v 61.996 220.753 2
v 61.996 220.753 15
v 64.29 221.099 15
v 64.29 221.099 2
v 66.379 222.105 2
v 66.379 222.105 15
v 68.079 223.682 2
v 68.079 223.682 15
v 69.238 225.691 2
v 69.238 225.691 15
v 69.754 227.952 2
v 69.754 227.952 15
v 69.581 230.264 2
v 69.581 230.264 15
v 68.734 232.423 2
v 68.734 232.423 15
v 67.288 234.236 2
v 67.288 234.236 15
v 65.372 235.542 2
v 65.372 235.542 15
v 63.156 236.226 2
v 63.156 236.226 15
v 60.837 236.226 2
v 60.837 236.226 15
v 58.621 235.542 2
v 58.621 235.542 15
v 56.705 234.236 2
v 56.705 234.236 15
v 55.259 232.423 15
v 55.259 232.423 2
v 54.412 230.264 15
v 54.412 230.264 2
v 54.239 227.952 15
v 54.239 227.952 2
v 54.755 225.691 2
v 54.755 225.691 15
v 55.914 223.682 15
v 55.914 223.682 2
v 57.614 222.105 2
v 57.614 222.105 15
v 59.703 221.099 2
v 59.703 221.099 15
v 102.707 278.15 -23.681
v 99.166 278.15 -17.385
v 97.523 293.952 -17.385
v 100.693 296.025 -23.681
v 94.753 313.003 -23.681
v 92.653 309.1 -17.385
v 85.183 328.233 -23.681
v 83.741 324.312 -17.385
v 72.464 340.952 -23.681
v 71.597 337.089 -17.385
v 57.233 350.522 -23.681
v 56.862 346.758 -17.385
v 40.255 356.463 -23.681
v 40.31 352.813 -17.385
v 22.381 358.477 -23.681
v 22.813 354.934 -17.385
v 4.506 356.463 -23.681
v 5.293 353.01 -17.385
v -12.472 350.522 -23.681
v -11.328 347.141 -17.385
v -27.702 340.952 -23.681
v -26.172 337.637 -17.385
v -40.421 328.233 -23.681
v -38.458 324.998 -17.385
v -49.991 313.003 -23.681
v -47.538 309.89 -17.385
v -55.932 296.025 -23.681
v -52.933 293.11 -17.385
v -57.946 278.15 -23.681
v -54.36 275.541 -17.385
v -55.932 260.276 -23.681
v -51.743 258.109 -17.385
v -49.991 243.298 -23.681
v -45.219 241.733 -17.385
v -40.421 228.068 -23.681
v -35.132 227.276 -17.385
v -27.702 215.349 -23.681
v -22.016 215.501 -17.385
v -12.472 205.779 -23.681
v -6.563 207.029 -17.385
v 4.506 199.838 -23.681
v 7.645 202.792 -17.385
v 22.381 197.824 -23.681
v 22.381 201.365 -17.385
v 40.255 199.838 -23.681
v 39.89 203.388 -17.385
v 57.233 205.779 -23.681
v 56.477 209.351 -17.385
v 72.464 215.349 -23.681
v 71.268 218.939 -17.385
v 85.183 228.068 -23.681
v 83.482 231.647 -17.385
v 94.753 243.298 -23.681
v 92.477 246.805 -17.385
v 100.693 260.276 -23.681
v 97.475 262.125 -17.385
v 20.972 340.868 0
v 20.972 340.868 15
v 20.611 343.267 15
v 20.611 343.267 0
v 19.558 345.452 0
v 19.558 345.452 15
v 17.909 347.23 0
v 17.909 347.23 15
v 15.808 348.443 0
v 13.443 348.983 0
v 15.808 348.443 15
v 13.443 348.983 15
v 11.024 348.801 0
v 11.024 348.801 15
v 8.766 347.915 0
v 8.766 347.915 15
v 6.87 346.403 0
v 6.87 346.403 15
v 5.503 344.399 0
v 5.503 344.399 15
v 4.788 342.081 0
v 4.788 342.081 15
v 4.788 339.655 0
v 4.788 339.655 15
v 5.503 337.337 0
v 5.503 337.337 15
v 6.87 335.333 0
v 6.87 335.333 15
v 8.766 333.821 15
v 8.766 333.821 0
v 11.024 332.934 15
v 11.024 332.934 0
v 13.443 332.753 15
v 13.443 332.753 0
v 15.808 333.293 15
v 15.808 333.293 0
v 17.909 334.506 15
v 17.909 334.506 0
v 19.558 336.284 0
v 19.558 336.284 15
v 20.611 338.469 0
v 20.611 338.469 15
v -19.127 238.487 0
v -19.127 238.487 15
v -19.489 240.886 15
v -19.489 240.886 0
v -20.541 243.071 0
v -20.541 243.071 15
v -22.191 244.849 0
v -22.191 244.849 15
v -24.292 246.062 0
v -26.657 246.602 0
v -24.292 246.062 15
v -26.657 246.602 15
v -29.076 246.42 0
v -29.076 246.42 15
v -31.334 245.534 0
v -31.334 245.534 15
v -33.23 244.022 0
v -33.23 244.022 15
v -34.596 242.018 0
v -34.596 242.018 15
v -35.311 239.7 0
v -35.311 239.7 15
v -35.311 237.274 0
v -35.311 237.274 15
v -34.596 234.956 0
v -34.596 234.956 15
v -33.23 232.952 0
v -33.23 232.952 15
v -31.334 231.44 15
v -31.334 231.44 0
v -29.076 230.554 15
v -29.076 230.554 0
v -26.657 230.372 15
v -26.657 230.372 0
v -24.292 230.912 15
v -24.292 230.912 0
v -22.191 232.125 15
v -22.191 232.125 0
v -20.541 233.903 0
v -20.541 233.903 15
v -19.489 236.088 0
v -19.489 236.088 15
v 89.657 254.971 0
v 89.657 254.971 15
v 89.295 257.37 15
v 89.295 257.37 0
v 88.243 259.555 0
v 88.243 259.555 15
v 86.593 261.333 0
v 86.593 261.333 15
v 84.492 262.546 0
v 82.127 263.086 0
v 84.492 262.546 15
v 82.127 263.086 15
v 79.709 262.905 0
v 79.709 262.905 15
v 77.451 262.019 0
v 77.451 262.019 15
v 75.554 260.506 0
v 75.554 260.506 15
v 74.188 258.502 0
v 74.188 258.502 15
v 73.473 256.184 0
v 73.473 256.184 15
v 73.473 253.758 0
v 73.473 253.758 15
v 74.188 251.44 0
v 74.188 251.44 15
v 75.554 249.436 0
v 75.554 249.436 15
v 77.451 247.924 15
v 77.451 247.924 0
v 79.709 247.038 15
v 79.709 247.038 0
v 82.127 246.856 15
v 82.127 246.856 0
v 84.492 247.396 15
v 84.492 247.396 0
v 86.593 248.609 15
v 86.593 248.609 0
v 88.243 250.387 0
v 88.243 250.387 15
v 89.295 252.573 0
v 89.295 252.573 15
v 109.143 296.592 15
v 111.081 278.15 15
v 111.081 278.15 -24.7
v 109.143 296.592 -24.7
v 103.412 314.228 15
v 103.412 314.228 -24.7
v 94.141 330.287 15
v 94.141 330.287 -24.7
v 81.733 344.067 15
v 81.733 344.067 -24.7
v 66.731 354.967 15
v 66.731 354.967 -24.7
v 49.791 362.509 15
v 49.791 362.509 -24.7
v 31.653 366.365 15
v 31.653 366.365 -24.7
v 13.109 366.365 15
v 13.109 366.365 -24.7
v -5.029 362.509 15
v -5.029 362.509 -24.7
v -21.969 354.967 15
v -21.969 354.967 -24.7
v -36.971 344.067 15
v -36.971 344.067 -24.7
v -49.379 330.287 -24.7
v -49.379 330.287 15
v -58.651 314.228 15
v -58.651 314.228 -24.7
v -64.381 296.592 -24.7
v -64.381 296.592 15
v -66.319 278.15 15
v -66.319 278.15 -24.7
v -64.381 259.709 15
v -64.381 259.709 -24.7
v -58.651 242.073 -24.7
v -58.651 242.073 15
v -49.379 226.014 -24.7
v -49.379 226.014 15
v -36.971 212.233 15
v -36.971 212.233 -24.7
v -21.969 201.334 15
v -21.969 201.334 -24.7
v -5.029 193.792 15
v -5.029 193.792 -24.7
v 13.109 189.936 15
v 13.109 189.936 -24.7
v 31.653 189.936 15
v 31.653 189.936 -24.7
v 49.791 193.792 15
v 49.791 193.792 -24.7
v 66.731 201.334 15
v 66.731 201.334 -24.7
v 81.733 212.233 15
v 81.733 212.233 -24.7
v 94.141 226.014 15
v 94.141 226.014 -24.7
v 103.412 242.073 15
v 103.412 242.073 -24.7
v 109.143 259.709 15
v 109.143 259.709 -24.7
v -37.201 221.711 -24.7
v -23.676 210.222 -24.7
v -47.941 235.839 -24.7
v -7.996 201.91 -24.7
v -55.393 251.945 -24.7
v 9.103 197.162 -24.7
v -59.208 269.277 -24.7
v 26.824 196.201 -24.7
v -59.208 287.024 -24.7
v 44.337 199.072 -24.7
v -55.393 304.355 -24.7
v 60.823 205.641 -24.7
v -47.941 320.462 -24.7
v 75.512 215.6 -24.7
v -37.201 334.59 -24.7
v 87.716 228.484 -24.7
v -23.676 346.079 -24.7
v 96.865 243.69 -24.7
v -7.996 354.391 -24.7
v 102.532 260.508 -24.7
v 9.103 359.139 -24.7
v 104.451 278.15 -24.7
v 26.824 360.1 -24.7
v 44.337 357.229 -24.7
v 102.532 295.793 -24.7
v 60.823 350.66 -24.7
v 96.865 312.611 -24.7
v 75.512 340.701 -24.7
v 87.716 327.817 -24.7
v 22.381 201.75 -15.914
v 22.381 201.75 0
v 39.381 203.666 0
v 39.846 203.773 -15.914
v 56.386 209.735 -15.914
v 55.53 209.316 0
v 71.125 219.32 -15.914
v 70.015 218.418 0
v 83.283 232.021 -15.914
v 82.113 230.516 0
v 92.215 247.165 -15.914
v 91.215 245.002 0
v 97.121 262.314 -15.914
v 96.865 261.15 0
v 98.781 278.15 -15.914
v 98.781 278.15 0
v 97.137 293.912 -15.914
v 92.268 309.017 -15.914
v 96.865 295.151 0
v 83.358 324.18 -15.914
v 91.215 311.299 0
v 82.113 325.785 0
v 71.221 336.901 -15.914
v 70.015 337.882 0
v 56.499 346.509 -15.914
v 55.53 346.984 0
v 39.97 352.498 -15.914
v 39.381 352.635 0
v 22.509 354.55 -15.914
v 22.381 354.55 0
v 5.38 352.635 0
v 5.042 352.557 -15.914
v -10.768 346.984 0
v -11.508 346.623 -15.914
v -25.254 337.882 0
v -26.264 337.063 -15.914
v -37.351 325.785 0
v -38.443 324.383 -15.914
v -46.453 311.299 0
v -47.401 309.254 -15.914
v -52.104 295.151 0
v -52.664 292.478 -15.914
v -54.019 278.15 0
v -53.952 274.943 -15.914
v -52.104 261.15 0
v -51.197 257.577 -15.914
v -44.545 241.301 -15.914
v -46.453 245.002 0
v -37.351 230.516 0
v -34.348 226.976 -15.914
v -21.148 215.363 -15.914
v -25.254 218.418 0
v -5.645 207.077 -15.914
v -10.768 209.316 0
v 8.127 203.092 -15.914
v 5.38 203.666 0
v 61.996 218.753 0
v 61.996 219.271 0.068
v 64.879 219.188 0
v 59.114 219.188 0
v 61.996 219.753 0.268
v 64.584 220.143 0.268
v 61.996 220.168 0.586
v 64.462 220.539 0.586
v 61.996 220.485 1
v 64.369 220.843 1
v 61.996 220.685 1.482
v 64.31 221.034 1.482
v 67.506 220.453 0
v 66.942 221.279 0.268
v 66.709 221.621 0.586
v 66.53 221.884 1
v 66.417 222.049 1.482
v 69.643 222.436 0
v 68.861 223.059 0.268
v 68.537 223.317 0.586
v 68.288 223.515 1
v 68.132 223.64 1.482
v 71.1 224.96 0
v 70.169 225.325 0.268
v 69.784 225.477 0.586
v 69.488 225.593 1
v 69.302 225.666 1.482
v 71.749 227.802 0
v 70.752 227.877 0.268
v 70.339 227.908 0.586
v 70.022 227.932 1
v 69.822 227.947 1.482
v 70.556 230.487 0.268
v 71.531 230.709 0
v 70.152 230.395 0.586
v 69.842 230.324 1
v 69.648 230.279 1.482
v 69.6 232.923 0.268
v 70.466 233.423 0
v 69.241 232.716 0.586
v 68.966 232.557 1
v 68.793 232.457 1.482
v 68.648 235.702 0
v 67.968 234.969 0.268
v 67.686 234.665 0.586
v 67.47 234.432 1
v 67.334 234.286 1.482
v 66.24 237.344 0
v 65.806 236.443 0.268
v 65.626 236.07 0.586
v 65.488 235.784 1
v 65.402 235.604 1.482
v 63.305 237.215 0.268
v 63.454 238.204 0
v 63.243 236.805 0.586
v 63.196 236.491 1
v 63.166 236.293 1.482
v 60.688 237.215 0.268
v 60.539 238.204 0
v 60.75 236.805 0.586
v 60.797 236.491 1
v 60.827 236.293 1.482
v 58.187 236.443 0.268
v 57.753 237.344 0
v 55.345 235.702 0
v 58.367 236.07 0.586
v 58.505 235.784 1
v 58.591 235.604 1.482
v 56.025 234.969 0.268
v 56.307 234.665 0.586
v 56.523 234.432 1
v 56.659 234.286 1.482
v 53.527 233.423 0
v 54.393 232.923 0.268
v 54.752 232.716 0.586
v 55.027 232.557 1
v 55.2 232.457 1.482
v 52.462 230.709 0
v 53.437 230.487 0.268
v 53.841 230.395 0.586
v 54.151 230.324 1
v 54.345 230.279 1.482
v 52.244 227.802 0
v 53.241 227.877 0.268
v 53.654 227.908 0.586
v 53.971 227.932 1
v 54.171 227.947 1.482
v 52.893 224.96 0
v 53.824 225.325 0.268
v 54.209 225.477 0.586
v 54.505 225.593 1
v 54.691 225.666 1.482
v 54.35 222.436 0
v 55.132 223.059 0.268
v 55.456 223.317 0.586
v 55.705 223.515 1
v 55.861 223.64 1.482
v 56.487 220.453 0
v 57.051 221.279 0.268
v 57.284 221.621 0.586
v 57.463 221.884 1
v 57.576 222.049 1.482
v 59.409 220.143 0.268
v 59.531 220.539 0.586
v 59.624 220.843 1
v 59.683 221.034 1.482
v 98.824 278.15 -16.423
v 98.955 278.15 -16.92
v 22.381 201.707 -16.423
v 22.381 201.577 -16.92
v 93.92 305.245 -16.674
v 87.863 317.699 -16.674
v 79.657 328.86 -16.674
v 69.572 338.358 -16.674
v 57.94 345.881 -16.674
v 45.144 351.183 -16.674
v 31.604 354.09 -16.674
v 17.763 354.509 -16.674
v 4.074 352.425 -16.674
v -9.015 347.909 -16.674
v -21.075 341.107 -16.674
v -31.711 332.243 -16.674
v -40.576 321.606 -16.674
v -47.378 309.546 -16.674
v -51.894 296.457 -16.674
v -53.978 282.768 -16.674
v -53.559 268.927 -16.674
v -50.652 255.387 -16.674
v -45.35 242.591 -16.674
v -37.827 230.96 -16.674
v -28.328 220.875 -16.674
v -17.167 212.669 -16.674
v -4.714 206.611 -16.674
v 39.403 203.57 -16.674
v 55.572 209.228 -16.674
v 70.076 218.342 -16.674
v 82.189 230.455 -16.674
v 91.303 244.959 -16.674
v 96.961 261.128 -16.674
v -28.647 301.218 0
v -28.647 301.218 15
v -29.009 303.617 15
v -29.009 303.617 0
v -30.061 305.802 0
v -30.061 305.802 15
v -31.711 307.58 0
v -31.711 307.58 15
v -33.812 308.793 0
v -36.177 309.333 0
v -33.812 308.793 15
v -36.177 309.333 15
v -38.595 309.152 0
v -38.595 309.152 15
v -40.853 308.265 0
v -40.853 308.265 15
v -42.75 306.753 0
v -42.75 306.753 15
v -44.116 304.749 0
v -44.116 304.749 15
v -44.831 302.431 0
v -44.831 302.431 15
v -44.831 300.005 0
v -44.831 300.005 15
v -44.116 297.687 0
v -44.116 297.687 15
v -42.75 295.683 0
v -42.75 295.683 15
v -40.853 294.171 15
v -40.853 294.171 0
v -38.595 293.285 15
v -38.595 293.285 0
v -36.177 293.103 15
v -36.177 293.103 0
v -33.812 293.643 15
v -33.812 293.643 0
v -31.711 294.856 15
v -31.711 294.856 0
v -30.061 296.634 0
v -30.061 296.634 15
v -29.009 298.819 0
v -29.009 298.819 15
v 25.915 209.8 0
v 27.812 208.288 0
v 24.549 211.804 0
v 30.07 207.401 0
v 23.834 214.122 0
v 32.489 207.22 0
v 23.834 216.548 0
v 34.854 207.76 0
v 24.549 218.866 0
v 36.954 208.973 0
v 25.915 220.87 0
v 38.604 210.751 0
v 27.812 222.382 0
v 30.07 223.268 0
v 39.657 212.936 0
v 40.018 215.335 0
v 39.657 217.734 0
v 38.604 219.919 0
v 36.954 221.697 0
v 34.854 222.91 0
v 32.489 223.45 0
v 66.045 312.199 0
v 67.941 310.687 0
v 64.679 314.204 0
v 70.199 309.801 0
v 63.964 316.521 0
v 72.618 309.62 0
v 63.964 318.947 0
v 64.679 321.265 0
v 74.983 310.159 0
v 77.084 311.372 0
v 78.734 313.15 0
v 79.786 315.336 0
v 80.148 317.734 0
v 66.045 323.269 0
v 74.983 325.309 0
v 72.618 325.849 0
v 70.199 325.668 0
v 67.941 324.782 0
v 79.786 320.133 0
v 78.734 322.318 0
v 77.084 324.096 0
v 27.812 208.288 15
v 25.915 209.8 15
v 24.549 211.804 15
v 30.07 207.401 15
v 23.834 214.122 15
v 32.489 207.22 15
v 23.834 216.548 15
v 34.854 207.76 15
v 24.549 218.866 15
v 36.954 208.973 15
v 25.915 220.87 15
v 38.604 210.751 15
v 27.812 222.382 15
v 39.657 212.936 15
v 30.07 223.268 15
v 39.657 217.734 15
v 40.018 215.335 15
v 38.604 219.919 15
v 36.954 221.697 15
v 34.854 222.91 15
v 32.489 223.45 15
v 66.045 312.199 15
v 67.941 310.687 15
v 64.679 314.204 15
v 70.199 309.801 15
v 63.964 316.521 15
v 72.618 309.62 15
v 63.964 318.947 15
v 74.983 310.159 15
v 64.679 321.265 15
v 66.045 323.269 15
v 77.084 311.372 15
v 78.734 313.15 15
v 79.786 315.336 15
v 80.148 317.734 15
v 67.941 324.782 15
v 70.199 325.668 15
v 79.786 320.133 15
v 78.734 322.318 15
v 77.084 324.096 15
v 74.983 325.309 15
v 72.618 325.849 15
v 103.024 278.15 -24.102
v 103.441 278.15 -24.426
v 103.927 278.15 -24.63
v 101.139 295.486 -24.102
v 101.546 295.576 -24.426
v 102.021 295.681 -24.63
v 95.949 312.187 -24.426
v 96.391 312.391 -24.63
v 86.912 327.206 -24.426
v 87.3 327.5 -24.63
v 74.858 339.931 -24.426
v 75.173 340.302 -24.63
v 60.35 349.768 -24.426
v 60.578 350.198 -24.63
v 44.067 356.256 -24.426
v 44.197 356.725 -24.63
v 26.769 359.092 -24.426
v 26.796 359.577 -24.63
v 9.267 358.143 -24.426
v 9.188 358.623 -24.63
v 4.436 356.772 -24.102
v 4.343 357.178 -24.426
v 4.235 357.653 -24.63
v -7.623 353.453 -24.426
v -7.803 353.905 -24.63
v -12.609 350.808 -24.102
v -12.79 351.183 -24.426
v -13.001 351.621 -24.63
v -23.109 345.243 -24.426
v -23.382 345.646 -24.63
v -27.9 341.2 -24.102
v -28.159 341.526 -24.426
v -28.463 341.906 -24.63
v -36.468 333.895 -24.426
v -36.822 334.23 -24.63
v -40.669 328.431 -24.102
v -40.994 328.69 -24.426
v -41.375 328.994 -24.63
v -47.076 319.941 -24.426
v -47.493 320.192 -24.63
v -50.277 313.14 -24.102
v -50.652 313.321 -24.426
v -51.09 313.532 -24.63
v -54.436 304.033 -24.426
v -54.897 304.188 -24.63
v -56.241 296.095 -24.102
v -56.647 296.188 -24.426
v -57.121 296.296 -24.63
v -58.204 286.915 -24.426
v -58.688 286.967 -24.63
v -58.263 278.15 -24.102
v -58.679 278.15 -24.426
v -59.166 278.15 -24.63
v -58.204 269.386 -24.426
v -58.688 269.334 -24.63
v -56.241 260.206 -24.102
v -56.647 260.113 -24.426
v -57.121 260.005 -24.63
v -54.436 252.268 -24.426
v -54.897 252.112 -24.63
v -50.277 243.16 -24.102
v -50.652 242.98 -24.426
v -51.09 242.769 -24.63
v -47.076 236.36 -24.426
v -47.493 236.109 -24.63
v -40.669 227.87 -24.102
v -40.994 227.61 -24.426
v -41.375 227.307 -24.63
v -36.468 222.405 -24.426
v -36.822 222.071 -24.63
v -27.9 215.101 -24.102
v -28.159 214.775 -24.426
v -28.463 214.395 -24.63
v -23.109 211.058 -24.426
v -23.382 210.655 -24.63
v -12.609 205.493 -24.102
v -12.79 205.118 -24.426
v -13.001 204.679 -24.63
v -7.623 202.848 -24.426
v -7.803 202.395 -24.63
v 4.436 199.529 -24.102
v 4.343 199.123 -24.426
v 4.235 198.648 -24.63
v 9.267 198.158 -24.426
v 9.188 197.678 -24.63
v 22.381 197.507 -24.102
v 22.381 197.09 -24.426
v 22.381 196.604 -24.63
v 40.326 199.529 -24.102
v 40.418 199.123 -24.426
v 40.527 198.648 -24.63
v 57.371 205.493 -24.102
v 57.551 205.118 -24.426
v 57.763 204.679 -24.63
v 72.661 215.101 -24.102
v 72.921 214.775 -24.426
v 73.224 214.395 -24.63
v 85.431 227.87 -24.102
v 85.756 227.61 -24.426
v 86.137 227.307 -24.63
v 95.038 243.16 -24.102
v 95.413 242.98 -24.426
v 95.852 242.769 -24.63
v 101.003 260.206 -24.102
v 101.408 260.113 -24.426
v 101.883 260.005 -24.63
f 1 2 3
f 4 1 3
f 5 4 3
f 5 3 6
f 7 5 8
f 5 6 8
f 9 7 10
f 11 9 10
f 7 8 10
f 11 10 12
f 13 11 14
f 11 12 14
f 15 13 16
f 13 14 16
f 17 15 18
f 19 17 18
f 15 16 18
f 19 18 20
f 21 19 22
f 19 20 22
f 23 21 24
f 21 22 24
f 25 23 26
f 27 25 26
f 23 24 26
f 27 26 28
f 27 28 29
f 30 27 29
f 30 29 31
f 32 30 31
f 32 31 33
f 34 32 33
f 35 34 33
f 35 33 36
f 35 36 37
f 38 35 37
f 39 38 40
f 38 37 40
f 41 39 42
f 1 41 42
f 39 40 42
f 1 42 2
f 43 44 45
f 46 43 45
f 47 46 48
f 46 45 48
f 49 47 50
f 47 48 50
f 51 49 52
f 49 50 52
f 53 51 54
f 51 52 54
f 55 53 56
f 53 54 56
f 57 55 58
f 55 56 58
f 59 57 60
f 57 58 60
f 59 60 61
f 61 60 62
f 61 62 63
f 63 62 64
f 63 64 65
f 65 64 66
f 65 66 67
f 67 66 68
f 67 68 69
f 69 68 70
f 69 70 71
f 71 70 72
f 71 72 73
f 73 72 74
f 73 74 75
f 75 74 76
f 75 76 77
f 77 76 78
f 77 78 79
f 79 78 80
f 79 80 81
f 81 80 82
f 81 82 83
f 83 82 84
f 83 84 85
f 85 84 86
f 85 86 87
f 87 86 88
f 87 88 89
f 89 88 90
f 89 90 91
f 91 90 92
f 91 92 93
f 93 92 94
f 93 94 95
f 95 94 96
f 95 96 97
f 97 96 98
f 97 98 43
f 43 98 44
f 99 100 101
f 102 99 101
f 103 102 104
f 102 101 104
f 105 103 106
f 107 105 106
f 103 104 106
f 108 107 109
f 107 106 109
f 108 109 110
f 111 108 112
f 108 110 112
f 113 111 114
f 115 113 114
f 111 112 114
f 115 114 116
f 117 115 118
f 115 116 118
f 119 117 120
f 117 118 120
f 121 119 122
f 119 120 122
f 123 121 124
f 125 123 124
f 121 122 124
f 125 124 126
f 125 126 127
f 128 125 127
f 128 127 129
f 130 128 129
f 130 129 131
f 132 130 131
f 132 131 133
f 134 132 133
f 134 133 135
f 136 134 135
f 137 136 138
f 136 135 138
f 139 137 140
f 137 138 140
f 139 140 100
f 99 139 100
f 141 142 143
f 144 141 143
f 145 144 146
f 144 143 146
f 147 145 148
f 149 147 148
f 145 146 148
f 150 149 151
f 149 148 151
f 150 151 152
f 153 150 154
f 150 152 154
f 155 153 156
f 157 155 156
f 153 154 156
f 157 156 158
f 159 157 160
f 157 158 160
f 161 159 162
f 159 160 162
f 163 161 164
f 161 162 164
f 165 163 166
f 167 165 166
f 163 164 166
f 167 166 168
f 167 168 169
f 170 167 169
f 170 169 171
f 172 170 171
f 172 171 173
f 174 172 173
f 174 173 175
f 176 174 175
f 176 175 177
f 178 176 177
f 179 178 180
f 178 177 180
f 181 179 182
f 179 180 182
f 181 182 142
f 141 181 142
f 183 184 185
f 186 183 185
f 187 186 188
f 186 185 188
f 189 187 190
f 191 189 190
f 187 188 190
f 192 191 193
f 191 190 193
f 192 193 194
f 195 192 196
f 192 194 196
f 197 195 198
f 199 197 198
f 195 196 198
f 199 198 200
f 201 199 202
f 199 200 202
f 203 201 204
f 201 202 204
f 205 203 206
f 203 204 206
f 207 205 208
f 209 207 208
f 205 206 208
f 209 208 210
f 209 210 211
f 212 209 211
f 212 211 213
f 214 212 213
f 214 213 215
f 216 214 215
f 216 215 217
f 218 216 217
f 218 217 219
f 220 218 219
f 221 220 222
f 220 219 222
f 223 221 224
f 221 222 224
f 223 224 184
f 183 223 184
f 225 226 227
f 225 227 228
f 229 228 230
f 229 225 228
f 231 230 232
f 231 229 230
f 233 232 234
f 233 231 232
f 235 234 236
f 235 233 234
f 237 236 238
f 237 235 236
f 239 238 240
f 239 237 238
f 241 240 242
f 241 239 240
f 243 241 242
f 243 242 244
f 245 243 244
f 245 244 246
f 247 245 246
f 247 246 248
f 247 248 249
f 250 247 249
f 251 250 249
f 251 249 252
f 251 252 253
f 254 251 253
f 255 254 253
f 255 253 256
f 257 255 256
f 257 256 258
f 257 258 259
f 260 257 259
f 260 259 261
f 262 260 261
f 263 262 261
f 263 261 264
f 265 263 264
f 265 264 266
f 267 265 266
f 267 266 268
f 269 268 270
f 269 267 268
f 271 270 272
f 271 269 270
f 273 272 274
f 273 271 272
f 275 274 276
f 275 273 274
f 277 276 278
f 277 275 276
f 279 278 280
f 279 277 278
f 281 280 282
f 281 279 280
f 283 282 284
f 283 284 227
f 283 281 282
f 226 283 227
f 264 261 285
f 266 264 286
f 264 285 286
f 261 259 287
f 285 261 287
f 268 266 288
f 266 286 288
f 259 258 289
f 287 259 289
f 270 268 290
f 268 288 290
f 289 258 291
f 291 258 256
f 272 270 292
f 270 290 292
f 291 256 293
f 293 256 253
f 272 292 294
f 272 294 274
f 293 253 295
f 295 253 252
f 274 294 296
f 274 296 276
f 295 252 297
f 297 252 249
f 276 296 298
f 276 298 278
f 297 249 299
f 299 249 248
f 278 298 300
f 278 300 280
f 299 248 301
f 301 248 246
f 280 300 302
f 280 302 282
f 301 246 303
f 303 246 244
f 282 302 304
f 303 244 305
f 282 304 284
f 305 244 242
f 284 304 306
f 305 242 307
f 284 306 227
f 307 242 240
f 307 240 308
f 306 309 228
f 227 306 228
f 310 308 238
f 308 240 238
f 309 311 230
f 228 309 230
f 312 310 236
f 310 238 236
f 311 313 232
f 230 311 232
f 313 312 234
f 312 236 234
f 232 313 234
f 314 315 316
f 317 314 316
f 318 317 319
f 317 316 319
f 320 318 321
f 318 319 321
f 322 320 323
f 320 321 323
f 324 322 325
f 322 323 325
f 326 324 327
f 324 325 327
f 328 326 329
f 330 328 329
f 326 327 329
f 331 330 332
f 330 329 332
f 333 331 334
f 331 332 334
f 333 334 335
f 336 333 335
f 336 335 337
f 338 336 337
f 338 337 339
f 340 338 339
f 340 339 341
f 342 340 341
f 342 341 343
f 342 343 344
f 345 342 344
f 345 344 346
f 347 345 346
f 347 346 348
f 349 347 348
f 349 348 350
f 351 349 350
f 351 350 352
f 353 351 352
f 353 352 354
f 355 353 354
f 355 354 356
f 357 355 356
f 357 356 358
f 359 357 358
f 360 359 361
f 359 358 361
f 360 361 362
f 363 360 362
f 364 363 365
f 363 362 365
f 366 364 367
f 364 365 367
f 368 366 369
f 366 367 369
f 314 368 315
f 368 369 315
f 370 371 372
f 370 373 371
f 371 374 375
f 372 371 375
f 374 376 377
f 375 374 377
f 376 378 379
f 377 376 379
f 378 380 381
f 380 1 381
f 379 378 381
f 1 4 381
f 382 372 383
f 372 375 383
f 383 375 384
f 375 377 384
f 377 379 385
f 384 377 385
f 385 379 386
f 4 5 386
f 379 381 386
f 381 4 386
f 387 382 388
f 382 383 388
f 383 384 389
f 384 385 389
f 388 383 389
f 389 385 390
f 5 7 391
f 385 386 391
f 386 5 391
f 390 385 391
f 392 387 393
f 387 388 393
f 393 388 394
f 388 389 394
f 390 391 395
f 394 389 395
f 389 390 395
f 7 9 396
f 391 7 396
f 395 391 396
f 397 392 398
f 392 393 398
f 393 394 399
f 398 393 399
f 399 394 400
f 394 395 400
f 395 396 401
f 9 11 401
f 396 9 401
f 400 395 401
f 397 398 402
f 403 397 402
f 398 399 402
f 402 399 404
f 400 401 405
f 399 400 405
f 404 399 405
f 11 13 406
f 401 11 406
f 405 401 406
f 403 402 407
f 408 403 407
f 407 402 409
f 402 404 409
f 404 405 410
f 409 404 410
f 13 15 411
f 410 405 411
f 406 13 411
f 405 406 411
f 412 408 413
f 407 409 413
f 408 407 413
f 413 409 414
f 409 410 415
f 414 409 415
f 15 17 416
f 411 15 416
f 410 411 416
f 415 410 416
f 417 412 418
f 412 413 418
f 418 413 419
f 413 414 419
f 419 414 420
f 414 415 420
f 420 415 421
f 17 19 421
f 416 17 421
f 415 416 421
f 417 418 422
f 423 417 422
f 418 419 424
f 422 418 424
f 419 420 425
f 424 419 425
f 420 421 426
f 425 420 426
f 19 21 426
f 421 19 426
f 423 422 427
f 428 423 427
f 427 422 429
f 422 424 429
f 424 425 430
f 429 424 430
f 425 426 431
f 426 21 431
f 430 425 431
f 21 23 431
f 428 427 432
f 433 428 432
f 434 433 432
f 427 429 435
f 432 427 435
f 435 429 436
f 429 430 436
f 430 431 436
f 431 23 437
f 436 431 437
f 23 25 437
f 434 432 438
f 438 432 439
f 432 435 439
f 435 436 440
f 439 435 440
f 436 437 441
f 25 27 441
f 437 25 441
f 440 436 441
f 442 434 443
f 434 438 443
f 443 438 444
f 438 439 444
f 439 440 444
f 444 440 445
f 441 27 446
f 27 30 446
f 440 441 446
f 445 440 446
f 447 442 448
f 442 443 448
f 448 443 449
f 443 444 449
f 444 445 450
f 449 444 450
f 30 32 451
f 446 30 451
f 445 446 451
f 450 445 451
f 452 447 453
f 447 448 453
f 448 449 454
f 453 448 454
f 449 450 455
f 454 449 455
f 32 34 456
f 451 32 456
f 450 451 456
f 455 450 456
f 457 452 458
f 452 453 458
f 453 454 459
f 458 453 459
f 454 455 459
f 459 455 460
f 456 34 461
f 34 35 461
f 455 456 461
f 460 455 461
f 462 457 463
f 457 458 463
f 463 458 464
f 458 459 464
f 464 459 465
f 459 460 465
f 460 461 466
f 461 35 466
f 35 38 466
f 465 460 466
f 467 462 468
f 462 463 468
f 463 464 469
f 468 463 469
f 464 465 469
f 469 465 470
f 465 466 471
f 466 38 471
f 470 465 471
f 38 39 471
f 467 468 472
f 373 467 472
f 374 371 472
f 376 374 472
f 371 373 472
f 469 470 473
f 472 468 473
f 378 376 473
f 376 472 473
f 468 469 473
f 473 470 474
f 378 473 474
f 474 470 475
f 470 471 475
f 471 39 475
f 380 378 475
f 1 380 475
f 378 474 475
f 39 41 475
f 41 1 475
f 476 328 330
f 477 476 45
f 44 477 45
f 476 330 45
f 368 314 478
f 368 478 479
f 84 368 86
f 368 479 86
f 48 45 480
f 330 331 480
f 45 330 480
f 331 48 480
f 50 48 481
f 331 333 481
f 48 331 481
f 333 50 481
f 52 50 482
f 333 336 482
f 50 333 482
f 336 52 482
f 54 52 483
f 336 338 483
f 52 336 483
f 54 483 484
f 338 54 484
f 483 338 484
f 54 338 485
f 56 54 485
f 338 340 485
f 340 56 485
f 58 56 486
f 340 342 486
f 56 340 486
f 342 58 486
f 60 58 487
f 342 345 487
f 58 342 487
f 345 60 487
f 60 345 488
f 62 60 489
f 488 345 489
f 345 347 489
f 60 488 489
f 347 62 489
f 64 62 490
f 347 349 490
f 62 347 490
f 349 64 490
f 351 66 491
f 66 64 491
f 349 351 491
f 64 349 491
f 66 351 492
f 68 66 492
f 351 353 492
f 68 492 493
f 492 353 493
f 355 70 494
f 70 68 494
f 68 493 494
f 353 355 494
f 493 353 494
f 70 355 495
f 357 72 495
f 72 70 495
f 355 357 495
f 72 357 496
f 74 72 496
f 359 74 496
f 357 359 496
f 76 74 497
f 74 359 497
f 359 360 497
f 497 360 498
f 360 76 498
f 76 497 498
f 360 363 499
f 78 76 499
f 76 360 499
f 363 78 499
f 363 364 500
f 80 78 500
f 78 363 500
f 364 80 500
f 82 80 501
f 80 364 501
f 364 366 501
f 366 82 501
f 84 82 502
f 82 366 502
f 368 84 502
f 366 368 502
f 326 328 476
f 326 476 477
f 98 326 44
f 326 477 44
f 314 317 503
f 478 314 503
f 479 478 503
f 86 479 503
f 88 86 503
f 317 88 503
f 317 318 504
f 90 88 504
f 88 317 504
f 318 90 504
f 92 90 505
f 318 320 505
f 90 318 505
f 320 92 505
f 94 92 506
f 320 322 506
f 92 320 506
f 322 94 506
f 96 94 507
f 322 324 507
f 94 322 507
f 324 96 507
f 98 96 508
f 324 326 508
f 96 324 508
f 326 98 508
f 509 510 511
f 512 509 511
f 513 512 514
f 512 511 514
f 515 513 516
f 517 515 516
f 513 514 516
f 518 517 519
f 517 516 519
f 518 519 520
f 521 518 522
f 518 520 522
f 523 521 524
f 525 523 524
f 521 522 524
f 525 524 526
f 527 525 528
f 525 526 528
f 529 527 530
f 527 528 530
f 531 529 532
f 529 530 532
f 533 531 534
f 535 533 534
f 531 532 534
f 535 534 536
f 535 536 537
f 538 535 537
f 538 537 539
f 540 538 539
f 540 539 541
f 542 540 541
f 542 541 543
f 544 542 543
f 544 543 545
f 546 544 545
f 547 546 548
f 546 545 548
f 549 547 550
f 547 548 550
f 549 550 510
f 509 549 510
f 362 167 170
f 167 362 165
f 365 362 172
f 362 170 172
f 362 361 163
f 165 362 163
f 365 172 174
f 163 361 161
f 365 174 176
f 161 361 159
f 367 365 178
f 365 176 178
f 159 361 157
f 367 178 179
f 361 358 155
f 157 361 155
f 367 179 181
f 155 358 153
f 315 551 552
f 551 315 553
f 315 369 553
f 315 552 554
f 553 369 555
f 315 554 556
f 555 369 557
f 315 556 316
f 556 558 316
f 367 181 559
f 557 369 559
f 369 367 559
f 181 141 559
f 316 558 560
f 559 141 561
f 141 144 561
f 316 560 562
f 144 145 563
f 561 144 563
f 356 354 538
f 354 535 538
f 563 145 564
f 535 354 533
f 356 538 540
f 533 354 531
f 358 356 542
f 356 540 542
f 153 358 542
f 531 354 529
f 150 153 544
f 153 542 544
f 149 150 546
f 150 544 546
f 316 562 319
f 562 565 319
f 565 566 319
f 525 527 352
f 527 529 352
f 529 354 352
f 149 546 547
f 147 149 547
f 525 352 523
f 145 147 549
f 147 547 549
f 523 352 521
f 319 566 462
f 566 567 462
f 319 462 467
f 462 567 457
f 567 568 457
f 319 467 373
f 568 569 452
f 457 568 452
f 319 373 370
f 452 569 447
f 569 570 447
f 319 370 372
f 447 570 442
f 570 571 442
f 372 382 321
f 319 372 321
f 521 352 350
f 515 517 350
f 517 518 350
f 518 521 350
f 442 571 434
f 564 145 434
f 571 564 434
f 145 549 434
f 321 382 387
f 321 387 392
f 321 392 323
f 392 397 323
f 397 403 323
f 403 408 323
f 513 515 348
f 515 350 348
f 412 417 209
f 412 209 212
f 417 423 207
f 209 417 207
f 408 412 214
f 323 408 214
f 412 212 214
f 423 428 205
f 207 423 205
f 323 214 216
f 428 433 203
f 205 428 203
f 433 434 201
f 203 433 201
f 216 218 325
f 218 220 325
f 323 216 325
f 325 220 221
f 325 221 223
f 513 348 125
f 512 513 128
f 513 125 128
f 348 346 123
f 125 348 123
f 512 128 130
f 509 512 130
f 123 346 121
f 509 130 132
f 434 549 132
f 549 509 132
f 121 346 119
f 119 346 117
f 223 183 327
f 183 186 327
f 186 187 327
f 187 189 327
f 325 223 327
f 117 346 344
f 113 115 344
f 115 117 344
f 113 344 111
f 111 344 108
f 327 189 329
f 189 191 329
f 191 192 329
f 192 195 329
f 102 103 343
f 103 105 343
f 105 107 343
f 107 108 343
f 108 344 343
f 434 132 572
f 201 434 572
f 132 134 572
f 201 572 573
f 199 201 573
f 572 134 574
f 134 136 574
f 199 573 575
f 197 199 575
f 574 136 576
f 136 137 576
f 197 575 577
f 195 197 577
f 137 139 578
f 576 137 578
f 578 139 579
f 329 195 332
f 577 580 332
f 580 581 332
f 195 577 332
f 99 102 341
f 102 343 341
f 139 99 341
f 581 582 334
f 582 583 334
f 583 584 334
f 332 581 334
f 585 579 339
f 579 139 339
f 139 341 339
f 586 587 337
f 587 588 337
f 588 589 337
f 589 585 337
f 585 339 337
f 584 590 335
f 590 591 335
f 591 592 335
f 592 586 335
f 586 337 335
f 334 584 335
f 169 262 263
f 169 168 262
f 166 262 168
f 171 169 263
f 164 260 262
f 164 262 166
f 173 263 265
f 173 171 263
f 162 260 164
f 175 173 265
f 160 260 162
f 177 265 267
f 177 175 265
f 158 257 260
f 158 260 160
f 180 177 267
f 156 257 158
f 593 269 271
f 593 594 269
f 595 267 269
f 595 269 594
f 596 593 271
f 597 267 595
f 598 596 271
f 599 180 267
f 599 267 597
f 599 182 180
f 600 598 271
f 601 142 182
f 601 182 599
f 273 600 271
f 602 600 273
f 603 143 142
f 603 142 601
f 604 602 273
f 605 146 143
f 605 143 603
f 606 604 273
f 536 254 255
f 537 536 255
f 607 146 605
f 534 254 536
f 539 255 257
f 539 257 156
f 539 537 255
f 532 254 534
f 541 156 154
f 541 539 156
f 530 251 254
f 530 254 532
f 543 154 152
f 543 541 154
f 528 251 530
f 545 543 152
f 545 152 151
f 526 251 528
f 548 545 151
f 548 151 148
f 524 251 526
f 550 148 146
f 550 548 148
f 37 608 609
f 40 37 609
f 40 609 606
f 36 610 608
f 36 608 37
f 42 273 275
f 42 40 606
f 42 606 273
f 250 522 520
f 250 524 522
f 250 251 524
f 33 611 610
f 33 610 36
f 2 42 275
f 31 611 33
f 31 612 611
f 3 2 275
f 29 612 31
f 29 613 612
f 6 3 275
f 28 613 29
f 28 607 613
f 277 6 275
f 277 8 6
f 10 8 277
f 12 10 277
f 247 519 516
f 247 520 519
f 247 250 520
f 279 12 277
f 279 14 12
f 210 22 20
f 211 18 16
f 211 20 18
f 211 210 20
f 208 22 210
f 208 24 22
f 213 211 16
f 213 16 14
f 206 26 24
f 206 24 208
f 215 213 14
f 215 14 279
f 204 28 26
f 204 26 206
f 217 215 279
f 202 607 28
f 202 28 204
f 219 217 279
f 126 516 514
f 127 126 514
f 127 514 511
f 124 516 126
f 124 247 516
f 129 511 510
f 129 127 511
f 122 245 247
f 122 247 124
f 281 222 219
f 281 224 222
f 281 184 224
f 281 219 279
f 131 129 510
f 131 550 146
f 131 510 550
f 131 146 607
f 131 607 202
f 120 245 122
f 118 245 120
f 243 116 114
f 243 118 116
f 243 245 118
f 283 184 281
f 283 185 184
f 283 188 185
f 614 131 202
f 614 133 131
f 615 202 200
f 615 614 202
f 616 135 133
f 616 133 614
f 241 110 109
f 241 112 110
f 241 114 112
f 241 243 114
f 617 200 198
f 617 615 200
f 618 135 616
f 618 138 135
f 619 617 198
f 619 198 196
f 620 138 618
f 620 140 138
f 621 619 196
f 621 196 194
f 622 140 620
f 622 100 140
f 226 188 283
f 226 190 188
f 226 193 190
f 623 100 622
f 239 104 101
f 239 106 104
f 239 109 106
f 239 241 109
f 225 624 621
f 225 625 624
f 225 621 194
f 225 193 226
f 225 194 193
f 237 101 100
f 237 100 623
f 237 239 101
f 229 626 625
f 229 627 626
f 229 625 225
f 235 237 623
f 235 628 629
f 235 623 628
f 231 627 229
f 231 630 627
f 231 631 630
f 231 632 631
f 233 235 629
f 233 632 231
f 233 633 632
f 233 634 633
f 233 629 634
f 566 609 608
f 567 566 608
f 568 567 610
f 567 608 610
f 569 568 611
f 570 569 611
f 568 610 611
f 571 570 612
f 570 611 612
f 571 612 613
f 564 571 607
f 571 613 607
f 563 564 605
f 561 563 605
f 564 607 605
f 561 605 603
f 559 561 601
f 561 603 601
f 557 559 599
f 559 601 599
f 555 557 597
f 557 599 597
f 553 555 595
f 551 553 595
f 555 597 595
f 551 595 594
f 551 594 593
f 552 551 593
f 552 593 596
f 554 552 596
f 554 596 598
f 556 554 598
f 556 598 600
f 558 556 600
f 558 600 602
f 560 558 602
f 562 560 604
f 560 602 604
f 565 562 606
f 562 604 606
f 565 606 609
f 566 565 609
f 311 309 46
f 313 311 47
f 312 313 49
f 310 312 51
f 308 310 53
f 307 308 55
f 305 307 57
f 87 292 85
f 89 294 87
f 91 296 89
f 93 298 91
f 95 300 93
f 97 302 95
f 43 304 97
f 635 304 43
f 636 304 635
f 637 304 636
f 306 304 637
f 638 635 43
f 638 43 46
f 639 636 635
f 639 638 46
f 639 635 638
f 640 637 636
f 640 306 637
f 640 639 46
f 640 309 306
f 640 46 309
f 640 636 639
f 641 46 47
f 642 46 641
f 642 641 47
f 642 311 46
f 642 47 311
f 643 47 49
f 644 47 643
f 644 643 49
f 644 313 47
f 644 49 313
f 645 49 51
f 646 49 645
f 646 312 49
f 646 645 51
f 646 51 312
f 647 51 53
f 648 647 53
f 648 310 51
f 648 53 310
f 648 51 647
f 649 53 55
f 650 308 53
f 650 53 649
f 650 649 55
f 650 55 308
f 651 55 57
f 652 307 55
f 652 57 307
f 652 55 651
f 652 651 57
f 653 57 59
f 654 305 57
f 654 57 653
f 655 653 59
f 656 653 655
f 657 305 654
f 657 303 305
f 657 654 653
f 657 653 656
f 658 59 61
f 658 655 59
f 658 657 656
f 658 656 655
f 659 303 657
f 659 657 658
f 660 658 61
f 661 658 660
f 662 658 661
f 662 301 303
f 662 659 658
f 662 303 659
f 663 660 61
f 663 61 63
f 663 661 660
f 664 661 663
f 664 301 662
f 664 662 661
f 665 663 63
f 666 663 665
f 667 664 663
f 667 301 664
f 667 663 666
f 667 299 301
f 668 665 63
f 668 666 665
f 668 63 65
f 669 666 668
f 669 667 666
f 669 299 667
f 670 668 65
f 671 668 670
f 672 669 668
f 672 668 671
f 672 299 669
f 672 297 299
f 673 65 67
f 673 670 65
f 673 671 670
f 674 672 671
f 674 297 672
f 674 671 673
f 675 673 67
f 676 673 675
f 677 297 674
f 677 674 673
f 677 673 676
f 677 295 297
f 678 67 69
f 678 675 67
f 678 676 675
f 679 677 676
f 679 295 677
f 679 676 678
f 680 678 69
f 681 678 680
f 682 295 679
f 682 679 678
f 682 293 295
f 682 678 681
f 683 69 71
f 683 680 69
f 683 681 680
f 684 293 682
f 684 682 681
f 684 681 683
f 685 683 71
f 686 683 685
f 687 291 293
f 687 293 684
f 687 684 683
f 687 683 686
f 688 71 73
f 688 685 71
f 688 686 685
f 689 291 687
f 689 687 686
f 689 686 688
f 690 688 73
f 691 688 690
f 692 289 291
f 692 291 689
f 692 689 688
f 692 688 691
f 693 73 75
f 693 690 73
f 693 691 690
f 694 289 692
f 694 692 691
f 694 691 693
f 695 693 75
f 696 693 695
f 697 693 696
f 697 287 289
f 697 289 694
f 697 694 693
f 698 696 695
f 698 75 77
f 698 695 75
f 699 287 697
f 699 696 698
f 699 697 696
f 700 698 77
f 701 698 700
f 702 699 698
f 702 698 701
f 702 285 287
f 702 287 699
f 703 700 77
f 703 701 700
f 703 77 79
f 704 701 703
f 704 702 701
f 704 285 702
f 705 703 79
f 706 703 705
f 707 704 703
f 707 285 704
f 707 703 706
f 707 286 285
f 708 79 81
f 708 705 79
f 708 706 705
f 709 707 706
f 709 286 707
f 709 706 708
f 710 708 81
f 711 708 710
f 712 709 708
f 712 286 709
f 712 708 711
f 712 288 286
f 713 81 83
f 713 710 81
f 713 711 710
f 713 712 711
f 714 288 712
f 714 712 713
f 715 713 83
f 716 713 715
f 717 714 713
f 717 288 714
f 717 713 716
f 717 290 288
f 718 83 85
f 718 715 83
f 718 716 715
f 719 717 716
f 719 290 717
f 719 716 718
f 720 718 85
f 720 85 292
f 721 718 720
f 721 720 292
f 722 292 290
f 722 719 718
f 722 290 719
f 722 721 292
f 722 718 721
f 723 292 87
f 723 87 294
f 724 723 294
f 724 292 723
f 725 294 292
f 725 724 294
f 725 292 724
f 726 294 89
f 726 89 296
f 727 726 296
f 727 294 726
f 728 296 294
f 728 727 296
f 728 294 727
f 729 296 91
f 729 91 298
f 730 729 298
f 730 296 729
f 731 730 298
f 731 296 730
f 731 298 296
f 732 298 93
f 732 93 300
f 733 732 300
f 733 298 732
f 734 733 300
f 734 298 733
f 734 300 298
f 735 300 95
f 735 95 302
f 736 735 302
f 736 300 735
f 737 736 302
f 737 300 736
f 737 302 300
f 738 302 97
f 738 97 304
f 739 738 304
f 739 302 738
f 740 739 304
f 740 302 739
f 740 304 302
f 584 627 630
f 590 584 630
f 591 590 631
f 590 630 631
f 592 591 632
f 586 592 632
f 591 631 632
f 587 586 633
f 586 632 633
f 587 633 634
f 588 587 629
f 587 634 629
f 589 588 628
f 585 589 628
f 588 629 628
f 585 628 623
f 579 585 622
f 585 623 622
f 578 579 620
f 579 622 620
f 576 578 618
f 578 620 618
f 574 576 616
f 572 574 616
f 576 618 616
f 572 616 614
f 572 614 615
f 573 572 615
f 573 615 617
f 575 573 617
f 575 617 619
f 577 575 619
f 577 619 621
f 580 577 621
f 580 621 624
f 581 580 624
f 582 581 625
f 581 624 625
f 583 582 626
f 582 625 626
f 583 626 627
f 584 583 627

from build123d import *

# Parameters (mm, degrees)
SKETCH2_R           = 88.7
BOSS_EXTRUDE1_DEPTH = 24.7
BOSS_EXTRUDE2_START = 15
SKETCH3_R           = 88.7
SKETCH3_R_2         = 8.1375
BOSS_EXTRUDE2_DEPTH = 15
FILLET1_R           = 2
FILLET2_R           = 3
FILLET3_R           = 2


with BuildPart() as part:
    # Sketch2 → Boss-Extrude1 (new body)
    with BuildSketch(Plane.XY):
        with Locations((22.380830856, 278.150413141)):
            Circle(SKETCH2_R)
        with BuildLine():
            ThreePointArc((22.380830856, 354.550413141), (-54.019169144, 278.150413141), (22.380830856, 201.750413141))
            ThreePointArc((22.380830856, 201.750413141), (98.780830856, 278.150413141), (22.380830856, 354.550413141))
        make_face(mode=Mode.SUBTRACT)
    extrude(amount=-BOSS_EXTRUDE1_DEPTH)

    # Sketch3 → Boss-Extrude2 (add)
    with BuildSketch(Plane.XY.offset(BOSS_EXTRUDE2_START)):
        with Locations((22.380830856, 278.150413141)):
            Circle(SKETCH3_R)
        with Locations((12.834949907, 340.867975839)):
            Circle(SKETCH3_R_2, mode=Mode.SUBTRACT)
        with Locations((72.010243633, 317.73432135)):
            Circle(SKETCH3_R_2, mode=Mode.SUBTRACT)
        with Locations((-36.784620153, 301.21805109)):
            Circle(SKETCH3_R_2, mode=Mode.SUBTRACT)
        with Locations((-27.264784017, 238.487003795)):
            Circle(SKETCH3_R_2, mode=Mode.SUBTRACT)
        with Locations((31.880563493, 215.334967411)):
            Circle(SKETCH3_R_2, mode=Mode.SUBTRACT)
        with Locations((81.519347087, 254.971228106)):
            Circle(SKETCH3_R_2, mode=Mode.SUBTRACT)
        with BuildLine():
            ThreePointArc((61.996469473, 236.312741601), (54.216779809, 228.533051937), (61.996469473, 220.753362274))
            ThreePointArc((61.996469473, 220.753362274), (69.776159136, 228.533051937), (61.996469473, 236.312741601))
        make_face(mode=Mode.SUBTRACT)
    extrude(amount=-BOSS_EXTRUDE2_DEPTH)

    # Fillet1
    fillet1_edges = [part.edges().sort_by_distance(p)[0] for p in [
        (61.996469473, 220.753362274, 0),
    ]]
    fillet(fillet1_edges, radius=FILLET1_R)

    # Chamfer1: read off the stored shape, not the designer's step
    # Chamfer1 outline → Chamfer1 (revolve, cut)
    with BuildSketch(Plane(origin=(22.380830856, 278.150413141, 0), x_dir=(1, 0, 0), z_dir=(0, -1, 0))):
        Polygon((80.9, -24.7), (76.4, -16.7), (76.4, -24.7), align=None)
    revolve(axis=Axis((22.380830856, 278.150413141, 0), (0, 0, 1)), mode=Mode.SUBTRACT)

    # Fillet2
    fillet2_edges = [part.edges().sort_by_distance(p)[0] for p in [
        (76.403788939, 332.173371224, -16.7),
    ]]
    fillet(fillet2_edges, radius=FILLET2_R)

    # Fillet3
    fillet3_edges = [part.edges().sort_by_distance(p)[0] for p in [
        (-58.519169144, 278.150413141, -24.7),
    ]]
    fillet(fillet3_edges, radius=FILLET3_R)


solid = part.part
